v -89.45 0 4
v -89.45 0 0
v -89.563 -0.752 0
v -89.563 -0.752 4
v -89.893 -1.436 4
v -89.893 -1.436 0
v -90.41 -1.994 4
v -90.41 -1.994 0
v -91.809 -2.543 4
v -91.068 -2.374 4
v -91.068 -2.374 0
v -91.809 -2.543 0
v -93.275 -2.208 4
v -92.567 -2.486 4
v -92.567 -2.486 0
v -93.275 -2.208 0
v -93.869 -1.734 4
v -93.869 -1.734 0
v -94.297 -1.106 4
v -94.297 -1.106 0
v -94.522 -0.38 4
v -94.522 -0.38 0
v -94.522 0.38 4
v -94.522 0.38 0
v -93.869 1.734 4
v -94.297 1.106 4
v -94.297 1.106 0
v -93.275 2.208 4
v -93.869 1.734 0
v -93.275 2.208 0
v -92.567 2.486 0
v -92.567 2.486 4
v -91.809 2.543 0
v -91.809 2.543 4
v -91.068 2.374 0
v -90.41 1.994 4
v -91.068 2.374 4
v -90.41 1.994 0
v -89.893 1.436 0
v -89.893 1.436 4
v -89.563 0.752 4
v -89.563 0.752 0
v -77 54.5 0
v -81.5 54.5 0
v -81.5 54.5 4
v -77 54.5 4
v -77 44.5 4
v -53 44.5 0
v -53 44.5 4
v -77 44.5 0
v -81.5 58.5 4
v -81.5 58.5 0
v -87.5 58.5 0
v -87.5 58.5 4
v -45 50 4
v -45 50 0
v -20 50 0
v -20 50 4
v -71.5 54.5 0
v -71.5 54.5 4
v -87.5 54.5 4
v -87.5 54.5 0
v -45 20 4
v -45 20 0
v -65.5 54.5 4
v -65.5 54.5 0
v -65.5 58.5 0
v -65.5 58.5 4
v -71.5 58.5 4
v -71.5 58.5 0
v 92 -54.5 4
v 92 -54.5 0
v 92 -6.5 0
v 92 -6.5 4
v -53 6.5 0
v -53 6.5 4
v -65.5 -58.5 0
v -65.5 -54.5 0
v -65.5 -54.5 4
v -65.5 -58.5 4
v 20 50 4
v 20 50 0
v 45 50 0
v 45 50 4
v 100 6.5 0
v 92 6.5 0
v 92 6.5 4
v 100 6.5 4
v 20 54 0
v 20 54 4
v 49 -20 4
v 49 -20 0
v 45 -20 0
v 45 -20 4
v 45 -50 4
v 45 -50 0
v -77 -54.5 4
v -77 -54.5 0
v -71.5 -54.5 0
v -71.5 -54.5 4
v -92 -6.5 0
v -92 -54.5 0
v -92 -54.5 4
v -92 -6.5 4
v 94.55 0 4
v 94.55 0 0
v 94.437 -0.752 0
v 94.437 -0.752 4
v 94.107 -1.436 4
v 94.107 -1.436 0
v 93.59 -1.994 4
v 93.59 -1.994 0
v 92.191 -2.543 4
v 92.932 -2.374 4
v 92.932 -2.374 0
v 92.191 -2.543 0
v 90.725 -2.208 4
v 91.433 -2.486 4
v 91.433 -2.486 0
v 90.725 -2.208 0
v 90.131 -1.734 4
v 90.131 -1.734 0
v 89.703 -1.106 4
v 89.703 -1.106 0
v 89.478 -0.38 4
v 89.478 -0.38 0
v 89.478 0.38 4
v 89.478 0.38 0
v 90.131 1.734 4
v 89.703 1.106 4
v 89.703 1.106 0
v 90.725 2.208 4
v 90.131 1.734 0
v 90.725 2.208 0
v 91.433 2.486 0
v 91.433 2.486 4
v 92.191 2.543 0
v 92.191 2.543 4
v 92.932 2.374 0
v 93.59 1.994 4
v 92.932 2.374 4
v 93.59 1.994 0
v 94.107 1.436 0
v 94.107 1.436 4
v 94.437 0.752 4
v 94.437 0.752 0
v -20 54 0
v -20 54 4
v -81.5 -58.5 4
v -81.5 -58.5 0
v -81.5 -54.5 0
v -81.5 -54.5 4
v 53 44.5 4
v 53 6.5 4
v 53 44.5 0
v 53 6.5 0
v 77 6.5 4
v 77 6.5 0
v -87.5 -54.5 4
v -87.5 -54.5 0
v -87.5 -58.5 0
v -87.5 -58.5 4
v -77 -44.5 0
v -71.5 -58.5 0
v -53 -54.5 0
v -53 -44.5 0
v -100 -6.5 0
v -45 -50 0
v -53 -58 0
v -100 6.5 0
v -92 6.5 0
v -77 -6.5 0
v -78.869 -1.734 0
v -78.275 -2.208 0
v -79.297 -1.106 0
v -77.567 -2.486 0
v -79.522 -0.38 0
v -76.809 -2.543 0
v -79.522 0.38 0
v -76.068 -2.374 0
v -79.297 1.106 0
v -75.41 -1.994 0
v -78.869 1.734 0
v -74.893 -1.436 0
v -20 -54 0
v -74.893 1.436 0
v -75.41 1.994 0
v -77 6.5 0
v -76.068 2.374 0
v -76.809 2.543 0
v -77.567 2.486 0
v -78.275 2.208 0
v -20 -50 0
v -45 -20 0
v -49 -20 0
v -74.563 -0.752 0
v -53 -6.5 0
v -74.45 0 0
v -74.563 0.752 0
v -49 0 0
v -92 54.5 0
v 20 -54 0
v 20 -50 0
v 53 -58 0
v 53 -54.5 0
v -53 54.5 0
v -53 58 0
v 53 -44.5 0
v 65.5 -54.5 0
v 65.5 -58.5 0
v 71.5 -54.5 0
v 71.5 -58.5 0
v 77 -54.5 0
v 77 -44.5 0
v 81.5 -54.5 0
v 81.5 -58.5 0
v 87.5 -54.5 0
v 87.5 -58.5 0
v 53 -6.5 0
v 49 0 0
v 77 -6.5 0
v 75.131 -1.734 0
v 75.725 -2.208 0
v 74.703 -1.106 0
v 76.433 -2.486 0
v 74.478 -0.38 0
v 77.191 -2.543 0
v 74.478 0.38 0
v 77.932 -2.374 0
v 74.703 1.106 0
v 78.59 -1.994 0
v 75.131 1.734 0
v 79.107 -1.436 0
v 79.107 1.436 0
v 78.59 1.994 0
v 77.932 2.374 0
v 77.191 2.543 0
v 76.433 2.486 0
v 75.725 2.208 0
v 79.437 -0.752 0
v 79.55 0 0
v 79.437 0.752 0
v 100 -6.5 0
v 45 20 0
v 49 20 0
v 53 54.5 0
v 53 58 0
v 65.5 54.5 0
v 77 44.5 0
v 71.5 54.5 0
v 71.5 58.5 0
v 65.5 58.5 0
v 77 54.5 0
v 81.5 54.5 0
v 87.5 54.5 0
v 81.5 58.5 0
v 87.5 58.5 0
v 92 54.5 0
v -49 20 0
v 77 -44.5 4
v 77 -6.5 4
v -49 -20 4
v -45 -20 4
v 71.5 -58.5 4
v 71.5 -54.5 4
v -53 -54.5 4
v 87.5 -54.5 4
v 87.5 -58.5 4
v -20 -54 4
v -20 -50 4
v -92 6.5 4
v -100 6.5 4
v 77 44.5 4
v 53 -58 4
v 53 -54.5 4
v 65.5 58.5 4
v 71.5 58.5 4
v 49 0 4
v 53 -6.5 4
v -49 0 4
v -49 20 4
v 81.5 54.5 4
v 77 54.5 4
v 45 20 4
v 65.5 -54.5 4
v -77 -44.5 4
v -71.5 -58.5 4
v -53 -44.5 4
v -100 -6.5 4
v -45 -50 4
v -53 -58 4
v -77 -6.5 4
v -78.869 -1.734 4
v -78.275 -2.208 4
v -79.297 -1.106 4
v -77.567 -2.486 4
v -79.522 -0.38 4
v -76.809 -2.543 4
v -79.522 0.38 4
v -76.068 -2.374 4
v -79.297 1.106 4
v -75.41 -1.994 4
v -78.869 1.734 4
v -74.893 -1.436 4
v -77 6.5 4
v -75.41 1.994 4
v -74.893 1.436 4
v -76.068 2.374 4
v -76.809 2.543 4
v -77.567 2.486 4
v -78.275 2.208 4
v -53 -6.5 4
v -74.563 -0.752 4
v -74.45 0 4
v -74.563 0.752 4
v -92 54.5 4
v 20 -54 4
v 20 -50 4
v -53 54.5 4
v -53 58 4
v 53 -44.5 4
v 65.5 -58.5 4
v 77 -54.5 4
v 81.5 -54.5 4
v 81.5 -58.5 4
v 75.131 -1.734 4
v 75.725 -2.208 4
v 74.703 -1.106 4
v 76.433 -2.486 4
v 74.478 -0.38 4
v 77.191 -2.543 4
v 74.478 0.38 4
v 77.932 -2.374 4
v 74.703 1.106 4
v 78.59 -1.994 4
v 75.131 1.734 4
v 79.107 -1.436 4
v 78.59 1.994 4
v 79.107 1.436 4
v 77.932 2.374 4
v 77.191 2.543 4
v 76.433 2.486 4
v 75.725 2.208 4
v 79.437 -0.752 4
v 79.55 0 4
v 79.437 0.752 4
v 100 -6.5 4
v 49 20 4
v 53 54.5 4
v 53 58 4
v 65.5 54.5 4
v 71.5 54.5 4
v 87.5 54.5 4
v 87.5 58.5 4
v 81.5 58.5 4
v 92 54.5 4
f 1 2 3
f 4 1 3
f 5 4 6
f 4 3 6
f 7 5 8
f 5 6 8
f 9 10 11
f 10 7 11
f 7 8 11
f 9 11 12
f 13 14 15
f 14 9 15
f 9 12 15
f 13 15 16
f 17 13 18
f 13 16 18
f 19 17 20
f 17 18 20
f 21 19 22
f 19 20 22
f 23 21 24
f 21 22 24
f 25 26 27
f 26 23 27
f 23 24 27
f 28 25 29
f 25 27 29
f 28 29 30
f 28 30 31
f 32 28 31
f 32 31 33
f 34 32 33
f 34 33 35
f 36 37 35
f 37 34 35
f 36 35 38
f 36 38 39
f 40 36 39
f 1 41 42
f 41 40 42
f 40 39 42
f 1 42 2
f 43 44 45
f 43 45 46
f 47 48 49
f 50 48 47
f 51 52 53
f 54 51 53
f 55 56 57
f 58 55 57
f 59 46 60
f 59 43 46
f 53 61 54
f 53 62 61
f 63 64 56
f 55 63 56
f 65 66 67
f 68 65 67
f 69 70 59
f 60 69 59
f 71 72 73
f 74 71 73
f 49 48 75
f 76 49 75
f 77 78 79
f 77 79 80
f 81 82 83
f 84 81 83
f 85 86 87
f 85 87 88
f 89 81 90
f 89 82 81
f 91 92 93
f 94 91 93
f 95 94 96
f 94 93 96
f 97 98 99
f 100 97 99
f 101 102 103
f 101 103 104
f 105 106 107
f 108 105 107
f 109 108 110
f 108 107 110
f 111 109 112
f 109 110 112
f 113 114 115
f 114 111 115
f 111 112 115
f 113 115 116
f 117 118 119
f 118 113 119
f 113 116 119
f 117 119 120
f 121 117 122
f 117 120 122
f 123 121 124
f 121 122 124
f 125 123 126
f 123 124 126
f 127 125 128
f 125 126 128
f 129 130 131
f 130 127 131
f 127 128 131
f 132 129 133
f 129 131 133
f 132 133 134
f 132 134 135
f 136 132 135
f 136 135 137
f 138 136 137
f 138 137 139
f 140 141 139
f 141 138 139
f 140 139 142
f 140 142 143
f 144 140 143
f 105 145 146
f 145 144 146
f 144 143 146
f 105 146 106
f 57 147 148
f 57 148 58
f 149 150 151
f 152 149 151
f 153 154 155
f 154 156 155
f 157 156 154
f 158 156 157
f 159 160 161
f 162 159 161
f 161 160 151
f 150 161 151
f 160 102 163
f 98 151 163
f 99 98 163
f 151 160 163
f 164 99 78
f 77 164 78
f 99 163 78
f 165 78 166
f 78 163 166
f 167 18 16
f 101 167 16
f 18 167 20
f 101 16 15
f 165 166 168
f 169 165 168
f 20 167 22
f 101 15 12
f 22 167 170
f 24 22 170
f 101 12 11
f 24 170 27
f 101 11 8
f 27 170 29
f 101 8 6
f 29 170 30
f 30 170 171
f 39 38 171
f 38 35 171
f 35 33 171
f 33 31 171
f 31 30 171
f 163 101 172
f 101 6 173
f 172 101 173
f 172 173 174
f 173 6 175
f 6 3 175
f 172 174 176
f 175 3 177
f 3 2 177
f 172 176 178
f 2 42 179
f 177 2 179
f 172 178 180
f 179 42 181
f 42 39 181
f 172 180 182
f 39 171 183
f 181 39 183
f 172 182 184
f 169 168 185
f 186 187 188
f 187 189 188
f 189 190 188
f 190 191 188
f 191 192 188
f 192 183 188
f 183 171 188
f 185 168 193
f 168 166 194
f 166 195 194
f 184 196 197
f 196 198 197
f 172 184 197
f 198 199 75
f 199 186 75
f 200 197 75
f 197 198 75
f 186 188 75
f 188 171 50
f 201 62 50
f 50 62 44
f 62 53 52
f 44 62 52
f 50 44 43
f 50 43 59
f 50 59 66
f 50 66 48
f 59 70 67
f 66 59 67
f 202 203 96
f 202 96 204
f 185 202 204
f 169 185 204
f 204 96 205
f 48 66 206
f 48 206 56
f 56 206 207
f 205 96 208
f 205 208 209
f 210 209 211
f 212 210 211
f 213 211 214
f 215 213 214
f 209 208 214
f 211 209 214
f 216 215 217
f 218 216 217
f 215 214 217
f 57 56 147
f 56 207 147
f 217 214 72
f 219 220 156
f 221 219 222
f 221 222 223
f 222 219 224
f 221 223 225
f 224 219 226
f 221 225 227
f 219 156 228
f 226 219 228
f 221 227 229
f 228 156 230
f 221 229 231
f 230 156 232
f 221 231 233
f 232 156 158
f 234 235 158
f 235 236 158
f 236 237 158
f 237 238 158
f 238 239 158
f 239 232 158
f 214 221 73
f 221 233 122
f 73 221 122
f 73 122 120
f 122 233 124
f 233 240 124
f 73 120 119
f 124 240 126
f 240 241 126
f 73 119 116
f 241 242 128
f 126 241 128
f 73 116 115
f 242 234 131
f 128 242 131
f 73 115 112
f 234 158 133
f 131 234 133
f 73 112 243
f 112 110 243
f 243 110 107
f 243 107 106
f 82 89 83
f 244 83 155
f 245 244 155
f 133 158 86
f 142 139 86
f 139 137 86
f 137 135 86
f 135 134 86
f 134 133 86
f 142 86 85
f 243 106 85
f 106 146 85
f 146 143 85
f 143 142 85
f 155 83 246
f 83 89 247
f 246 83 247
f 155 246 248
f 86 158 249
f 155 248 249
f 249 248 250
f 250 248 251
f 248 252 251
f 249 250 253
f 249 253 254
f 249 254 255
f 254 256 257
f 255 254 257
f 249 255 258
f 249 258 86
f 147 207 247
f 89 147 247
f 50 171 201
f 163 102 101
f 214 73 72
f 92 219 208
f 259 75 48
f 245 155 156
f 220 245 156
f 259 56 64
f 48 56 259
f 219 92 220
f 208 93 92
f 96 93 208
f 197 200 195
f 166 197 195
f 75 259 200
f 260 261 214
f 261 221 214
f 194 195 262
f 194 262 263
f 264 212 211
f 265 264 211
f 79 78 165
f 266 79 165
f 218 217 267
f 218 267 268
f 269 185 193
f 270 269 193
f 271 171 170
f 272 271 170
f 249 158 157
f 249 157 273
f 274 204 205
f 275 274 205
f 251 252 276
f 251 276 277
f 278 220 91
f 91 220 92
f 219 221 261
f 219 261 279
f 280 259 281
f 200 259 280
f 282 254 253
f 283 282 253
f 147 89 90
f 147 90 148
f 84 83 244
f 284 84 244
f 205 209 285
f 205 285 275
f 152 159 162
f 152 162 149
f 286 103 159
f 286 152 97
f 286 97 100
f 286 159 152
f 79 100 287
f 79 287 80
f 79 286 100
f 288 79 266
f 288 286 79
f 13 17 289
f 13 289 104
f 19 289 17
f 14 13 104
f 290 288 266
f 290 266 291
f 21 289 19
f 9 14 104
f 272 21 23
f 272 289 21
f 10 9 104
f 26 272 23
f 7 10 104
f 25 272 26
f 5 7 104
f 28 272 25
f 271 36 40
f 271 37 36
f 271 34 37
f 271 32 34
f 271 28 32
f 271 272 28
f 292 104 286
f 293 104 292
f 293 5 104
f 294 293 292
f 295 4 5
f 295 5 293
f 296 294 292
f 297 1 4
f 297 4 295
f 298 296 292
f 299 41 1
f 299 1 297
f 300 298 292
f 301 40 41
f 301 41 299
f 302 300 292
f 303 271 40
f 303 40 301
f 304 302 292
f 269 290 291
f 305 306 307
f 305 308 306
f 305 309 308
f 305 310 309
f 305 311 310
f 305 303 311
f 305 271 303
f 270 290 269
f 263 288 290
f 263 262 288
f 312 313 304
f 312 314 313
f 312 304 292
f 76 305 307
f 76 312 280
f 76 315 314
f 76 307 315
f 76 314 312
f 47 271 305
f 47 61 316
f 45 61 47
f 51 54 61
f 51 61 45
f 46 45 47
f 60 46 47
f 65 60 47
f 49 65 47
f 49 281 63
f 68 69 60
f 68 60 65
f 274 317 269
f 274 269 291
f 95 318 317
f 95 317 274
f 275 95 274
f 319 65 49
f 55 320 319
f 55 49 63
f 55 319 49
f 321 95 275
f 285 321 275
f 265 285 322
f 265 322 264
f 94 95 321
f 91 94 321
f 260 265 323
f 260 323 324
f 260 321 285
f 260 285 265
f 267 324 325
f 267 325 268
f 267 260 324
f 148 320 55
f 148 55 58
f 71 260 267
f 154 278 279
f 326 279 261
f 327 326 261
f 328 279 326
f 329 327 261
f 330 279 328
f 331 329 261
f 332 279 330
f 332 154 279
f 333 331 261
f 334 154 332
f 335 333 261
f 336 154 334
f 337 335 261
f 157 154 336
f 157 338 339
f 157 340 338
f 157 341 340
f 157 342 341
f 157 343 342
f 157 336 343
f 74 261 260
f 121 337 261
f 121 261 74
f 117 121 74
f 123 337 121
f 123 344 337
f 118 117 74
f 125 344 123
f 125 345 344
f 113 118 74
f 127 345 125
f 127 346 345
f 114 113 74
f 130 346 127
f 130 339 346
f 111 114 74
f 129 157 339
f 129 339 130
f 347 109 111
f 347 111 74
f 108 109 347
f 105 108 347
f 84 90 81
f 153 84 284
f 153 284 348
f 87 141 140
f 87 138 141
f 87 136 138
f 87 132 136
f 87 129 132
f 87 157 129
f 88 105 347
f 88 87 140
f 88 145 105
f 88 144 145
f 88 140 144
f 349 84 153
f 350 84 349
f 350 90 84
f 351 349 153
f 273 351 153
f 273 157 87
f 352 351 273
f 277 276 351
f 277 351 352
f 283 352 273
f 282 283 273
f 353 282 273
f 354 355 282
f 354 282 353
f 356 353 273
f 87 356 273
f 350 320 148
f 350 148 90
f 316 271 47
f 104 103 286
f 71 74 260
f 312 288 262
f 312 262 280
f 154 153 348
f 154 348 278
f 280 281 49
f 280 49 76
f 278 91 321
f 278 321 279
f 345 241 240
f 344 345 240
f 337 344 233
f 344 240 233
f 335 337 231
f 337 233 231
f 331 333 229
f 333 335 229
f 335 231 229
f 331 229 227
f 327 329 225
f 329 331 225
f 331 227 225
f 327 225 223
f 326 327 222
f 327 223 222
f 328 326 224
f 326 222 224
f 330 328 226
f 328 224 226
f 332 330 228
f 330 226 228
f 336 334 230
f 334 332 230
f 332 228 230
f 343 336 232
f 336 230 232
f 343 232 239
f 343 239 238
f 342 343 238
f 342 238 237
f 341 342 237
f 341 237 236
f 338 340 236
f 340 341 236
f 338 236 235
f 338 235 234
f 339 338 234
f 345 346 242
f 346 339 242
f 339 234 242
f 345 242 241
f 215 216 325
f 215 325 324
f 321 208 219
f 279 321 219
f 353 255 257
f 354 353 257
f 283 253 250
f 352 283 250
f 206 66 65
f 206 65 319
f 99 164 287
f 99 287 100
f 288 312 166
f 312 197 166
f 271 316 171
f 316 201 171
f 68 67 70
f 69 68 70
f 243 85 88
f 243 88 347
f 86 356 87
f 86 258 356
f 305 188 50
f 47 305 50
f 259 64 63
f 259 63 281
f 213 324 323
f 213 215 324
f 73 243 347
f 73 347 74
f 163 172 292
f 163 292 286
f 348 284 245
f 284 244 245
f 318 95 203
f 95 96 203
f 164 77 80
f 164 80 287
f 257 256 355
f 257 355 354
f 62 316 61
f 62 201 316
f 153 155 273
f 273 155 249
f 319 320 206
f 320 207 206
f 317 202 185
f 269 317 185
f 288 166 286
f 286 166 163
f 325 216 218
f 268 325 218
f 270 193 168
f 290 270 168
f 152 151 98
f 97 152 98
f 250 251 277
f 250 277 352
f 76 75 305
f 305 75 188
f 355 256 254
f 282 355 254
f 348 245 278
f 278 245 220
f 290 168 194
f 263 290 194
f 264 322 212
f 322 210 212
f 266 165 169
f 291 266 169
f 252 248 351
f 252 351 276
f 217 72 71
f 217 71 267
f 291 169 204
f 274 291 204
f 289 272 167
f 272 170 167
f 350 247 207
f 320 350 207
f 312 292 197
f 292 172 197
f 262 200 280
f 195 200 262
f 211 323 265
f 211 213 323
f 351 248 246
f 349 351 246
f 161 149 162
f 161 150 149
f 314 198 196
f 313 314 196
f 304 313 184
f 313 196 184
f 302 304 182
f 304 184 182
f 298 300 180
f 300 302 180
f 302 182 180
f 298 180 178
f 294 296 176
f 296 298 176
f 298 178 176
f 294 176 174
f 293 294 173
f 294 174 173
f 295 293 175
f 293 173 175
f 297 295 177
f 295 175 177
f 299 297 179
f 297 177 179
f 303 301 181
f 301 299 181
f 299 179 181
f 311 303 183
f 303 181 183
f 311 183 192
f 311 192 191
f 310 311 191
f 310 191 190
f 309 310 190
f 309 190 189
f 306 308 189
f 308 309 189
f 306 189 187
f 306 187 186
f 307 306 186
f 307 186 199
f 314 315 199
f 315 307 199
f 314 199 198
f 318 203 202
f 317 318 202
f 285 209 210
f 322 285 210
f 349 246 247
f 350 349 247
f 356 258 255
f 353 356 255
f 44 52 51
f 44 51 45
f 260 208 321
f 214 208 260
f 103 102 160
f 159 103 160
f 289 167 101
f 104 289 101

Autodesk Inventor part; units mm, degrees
ref_plane "YZ Plane" through (0, 0, 0) normal (1, 0, 0) x (0, 1, 0)
ref_plane "XZ Plane" through (0, 0, 0) normal (0, 1, 0) x (-1, 0, 0)
ref_plane "XY Plane" through (0, 0, 0) normal (0, 0, 1) x (1, 0, 0)
sketch "Sketch1" plane through (0, 0, 0) normal (0, 0, 1) x (1, 0, 0)
  line L0 (45, -50) -> (-45, -50)
  line L1 (-45, -50) -> (-45, 50)
  line L2 (-45, 50) -> (45, 50)
  line L3 (45, 50) -> (45, -50)
  line L4 (45, -50) -> (-45, 50) construction
  line L5 (-45, -50) -> (45, 50) construction
  line L6 (53, 58) -> (-53, 58)
  line L7 (-53, 58) -> (-53, 54.5)
  line L8 (-53, -58) -> (53, -58)
  line L9 (53, -58) -> (53, -54.5)
  line L10 (-20, 50) -> (20, 50)
  line L11 (20, 50) -> (20, 54)
  line L12 (20, 54) -> (-20, 54)
  line L13 (-20, 54) -> (-20, 50)
  line L14 (-20, -50) -> (20, -50)
  line L15 (20, -50) -> (20, -54)
  line L16 (20, -54) -> (-20, -54)
  line L17 (-20, -54) -> (-20, -50)
  line L18 (-45, 20) -> (-49, 20)
  line L19 (-49, 20) -> (-49, -20)
  line L20 (-49, -20) -> (-45, -20)
  line L21 (-45, -20) -> (-45, 20)
  line L22 (45, 20) -> (49, 20)
  line L23 (49, 20) -> (49, -20)
  line L24 (49, -20) -> (45, -20)
  line L25 (45, -20) -> (45, 20)
  line L26 (-53, 6.5) -> (-77, 6.5)
  line L27 (-100, 6.5) -> (-100, -6.5)
  line L28 (-100, -6.5) -> (-92, -6.5)
  line L29 (-53, -6.5) -> (-53, 6.5) construction
  line L30 (-53, 0) -> (53, 0)
  circle A0 centre (-92, 0) radius 2.55
  circle A1 centre (-77, 0) radius 2.55
  line L31 (0, 50) -> (0, -50)
  line L32 (-53, 6.5) -> (-53, -6.5) construction
  line L33 (-53, -6.5) -> (-53, -44.5)
  line L34 (53, 6.5) -> (53, 44.5)
  line L35 (53, -6.5) -> (53, 6.5) construction
  line L36 (-92, -6.5) -> (-77, -6.5) construction
  line L37 (-77, -6.5) -> (-77, -44.5)
  line L38 (-77, -58) -> (-92, -58) construction
  line L39 (-92, -58) -> (-92, -54.5) construction
  line L40 (-92, -58) -> (-77, -58) construction
  line L41 (-77, -58) -> (-77, -58.5) construction
  line L42 (-77, -58.5) -> (-81.5, -58.5) construction
  line L43 (-92, -58.5) -> (-92, -58) construction
  line L44 (-92, -54.5) -> (-87.5, -54.5)
  line L45 (-87.5, -54.5) -> (-87.5, -58.5)
  line L46 (-81.5, -58.5) -> (-81.5, -54.5)
  line L47 (-81.5, -54.5) -> (-77, -54.5)
  line L48 (-77, 6.5) -> (-77, 44.5)
  line L49 (-77, 58) -> (-92, 58) construction
  line L50 (-92, 58) -> (-92, 54.5) construction
  line L51 (-92, 58) -> (-77, 58) construction
  line L52 (-77, 58) -> (-77, 58.5) construction
  line L53 (-77, 58.5) -> (-81.5, 58.5) construction
  line L54 (-92, 58.5) -> (-92, 58) construction
  line L55 (-92, 54.5) -> (-87.5, 54.5)
  line L56 (-87.5, 54.5) -> (-87.5, 58.5)
  line L57 (-81.5, 58.5) -> (-81.5, 54.5)
  line L58 (-81.5, 54.5) -> (-77, 54.5)
  line L59 (-77, 6.5) -> (-92, 6.5) construction
  line L60 (-92, 6.5) -> (-100, 6.5)
  line L61 (-92, -6.5) -> (-77, -6.5) construction
  line L62 (-77, -6.5) -> (-53, -6.5)
  line L63 (-77, 54.5) -> (-77, 58) construction
  line L64 (-92, 54.5) -> (-92, 6.5)
  line L65 (-87.5, 58.5) -> (-92, 58.5) construction
  line L66 (-81.5, 58.5) -> (-87.5, 58.5)
  line L67 (-92, -54.5) -> (-92, -6.5)
  line L68 (-87.5, -58.5) -> (-92, -58.5) construction
  line L69 (-81.5, -58.5) -> (-87.5, -58.5)
  line L70 (-77, -54.5) -> (-77, -58) construction
  line L71 (-77, 54.5) -> (-71.5, 54.5)
  line L72 (-53, 54.5) -> (-53, 44.5) construction
  line L73 (-53, 44.5) -> (-77, 44.5)
  line L74 (-77, 44.5) -> (-77, 54.5) construction
  line L75 (-77, -54.5) -> (-71.5, -54.5)
  line L76 (-53, -54.5) -> (-53, -54)
  line L77 (-53, -44.5) -> (-77, -44.5)
  line L78 (-77, -44.5) -> (-77, -54.5) construction
  line L79 (-71.5, 54.5) -> (-65.5, 54.5) construction
  line L80 (-65.5, 54.5) -> (-65.5, 58.5)
  line L81 (-65.5, 58.5) -> (-71.5, 58.5)
  line L82 (-71.5, 58.5) -> (-71.5, 54.5)
  line L83 (-71.5, -54.5) -> (-65.5, -54.5) construction
  line L84 (-65.5, -54.5) -> (-65.5, -58.5)
  line L85 (-65.5, -58.5) -> (-71.5, -58.5)
  line L86 (-71.5, -58.5) -> (-71.5, -54.5)
  line L87 (-71.5, 54.5) -> (-65.5, 54.5) construction
  line L88 (-65.5, 54.5) -> (-53, 54.5)
  line L89 (-77, 44.5) -> (-77, 54.5) construction
  line L90 (-53, 44.5) -> (-53, 6.5)
  line L91 (-53, 54.5) -> (-53, 44.5) construction
  line L92 (-77, -44.5) -> (-77, -54.5) construction
  line L93 (-53, -44.5) -> (-53, -54.5) construction
  line L94 (-53, -54) -> (-53, -44.5) construction
  line L95 (-65.5, -54.5) -> (-53, -54.5)
  line L96 (-71.5, -54.5) -> (-65.5, -54.5) construction
  line L97 (-53, -54.5) -> (-53, -58)
  line L98 (53, 6.5) -> (77, 6.5)
  line L99 (100, 6.5) -> (100, -6.5)
  line L100 (100, -6.5) -> (92, -6.5)
  circle A2 centre (92, 0) radius 2.55
  circle A3 centre (77, 0) radius 2.55
  line L101 (92, -6.5) -> (77, -6.5) construction
  line L102 (77, -6.5) -> (77, -44.5)
  line L103 (77, -58) -> (92, -58) construction
  line L104 (92, -58) -> (92, -54.5) construction
  line L105 (92, -58) -> (77, -58) construction
  line L106 (77, -58) -> (77, -58.5) construction
  line L107 (77, -58.5) -> (81.5, -58.5) construction
  line L108 (92, -58.5) -> (92, -58) construction
  line L109 (92, -54.5) -> (87.5, -54.5)
  line L110 (87.5, -54.5) -> (87.5, -58.5)
  line L111 (81.5, -58.5) -> (81.5, -54.5)
  line L112 (81.5, -54.5) -> (77, -54.5)
  line L113 (92, 54.5) -> (87.5, 54.5)
  line L114 (92, 58) -> (92, 54.5) construction
  line L115 (77, 6.5) -> (77, 44.5)
  line L116 (81.5, 54.5) -> (77, 54.5)
  line L117 (77, 58) -> (92, 58) construction
  line L118 (92, 58) -> (77, 58) construction
  line L119 (77, 58) -> (77, 58.5) construction
  line L120 (77, 58.5) -> (81.5, 58.5) construction
  line L121 (81.5, 58.5) -> (81.5, 54.5)
  line L122 (92, 58.5) -> (92, 58) construction
  line L123 (87.5, 54.5) -> (87.5, 58.5)
  line L124 (77, 6.5) -> (92, 6.5) construction
  line L125 (92, 6.5) -> (100, 6.5)
  line L126 (92, -6.5) -> (77, -6.5) construction
  line L127 (77, -6.5) -> (53, -6.5)
  line L128 (77, 54.5) -> (77, 58) construction
  line L129 (92, 54.5) -> (92, 6.5)
  line L130 (87.5, 58.5) -> (92, 58.5) construction
  line L131 (81.5, 58.5) -> (87.5, 58.5)
  line L132 (92, -54.5) -> (92, -6.5)
  line L133 (87.5, -58.5) -> (92, -58.5) construction
  line L134 (81.5, -58.5) -> (87.5, -58.5)
  line L135 (77, -54.5) -> (77, -58) construction
  line L136 (77, 54.5) -> (71.5, 54.5)
  line L137 (53, 44.5) -> (77, 44.5)
  line L138 (77, 44.5) -> (77, 54.5) construction
  line L139 (77, -54.5) -> (71.5, -54.5)
  line L140 (53, -44.5) -> (77, -44.5)
  line L141 (77, -44.5) -> (77, -54.5) construction
  line L142 (71.5, 54.5) -> (65.5, 54.5) construction
  line L143 (65.5, 54.5) -> (65.5, 58.5)
  line L144 (65.5, 58.5) -> (71.5, 58.5)
  line L145 (71.5, 58.5) -> (71.5, 54.5)
  line L146 (71.5, -54.5) -> (65.5, -54.5) construction
  line L147 (65.5, -54.5) -> (65.5, -58.5)
  line L148 (65.5, -58.5) -> (71.5, -58.5)
  line L149 (71.5, -58.5) -> (71.5, -54.5)
  line L150 (71.5, 54.5) -> (65.5, 54.5) construction
  line L151 (65.5, 54.5) -> (53, 54.5)
  line L152 (77, 44.5) -> (77, 54.5) construction
  line L153 (77, -44.5) -> (77, -54.5) construction
  line L154 (65.5, -54.5) -> (53, -54.5)
  line L155 (71.5, -54.5) -> (65.5, -54.5) construction
  line L156 (53, 44.5) -> (53, 54.5) construction
  line L157 (53, 54.5) -> (53, 58)
  line L158 (53, -44.5) -> (53, -6.5)
  line L159 (53, -54.5) -> (53, -44.5) construction
  point P0 (0, 0)
  point P1 (0, 54)
  point P2 (0, 0)
  point P3 (-49, 0)
  point P4 (0, 0)
  point P5 (-53, 0)
  point P6 (0, 0)
  point P7 (0, 0)
  point P8 (-84.5, -58)
  point P9 (-84.5, 58)
  point P10 (-65, 44.5)
  point P11 (-81.5, 56.5)
  point P12 (-71.5, 56.5)
  point P13 (84.5, -58)
  point P14 (84.5, 58)
  point P15 (65, 44.5)
  point P16 (81.5, 56.5)
  point P17 (71.5, 56.5)
  dimension "d0" = 100
  dimension "d1" = 90
  dimension "d2" = 8
  dimension "d3" = 4
  dimension "d4" = 4
  dimension "d5" = 40
  dimension "d6" = 40
  dimension "d7" = 4
  dimension "d8" = 4
  dimension "d9" = 13
  dimension "d10" = 47
  dimension "d11" = 5.1
  dimension "d12" = 15
  dimension "d13" = 24
  dimension "d14" = 4
  dimension "d15" = 4
  dimension "d16" = 15
  dimension "d17" = 0.5
  dimension "d18" = 6
  dimension "d19" = 4.5
  dimension "d20" = 4.5
  dimension "d21" = 4
  dimension "d24" = 10
  dimension "d25" = 10
  dimension "d27" = 10
  dimension "d28" = 6
extrude "Extrusion1" add sketch "Sketch1" along normal blind 4
properties part number "DoorFrameRearL2_V3" material "Wood (Oak)"
